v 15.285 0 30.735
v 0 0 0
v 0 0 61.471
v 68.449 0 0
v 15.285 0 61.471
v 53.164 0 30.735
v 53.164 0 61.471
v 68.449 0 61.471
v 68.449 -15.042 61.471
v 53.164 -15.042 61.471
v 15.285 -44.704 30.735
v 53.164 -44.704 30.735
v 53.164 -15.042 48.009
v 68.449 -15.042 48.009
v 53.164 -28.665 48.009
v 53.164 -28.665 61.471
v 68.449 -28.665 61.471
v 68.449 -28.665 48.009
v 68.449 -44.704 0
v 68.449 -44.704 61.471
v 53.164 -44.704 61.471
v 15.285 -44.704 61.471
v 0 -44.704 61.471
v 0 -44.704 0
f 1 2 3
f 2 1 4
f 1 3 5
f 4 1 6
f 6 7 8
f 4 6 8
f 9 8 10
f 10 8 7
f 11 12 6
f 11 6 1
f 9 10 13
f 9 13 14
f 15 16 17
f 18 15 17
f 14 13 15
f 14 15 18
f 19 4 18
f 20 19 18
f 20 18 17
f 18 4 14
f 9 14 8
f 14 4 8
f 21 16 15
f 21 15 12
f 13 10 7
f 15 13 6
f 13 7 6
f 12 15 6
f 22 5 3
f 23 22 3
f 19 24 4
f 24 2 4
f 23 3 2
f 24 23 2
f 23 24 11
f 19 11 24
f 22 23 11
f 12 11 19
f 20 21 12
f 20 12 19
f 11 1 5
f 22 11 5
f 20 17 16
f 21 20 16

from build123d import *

# Parameters (mm, degrees)
F1_DEPTH = 25.4
F2_DEPTH = 19.304
F3_W     = 15.2846500278
F3_H     = 13.6232702062
F4_DEPTH = 13.462


with BuildPart() as f1:
    # F0 (on Front) → F1 (new body)
    with BuildSketch(Plane.XZ):
        Polygon((0, 61.4708550274), (0, 0), (68.4486366808, 0), (68.4486366808, 61.4708550274), (53.1639866531, 61.4708550274), (53.1639866531, 30.7354275137), (15.2846500278, 30.7354275137), (15.2846500278, 61.4708550274), align=None)
    extrude(amount=F1_DEPTH)

    # F2 (add): a face of the model
    f2_faces = [f1.faces().sort_by_distance(p)[0] for p in [
        (34.2243183404, -25.4, 24.8565047474),
    ]]
    extrude(f2_faces, amount=F2_DEPTH)

    # F3 (on face) → F4 (cut)
    with BuildSketch(Plane.XY.offset(61.4708550274)):
        with Locations((60.806311667, -21.8535889871)):
            Rectangle(F3_W, F3_H)
    extrude(amount=-F4_DEPTH, mode=Mode.SUBTRACT)


solid = f1.part
